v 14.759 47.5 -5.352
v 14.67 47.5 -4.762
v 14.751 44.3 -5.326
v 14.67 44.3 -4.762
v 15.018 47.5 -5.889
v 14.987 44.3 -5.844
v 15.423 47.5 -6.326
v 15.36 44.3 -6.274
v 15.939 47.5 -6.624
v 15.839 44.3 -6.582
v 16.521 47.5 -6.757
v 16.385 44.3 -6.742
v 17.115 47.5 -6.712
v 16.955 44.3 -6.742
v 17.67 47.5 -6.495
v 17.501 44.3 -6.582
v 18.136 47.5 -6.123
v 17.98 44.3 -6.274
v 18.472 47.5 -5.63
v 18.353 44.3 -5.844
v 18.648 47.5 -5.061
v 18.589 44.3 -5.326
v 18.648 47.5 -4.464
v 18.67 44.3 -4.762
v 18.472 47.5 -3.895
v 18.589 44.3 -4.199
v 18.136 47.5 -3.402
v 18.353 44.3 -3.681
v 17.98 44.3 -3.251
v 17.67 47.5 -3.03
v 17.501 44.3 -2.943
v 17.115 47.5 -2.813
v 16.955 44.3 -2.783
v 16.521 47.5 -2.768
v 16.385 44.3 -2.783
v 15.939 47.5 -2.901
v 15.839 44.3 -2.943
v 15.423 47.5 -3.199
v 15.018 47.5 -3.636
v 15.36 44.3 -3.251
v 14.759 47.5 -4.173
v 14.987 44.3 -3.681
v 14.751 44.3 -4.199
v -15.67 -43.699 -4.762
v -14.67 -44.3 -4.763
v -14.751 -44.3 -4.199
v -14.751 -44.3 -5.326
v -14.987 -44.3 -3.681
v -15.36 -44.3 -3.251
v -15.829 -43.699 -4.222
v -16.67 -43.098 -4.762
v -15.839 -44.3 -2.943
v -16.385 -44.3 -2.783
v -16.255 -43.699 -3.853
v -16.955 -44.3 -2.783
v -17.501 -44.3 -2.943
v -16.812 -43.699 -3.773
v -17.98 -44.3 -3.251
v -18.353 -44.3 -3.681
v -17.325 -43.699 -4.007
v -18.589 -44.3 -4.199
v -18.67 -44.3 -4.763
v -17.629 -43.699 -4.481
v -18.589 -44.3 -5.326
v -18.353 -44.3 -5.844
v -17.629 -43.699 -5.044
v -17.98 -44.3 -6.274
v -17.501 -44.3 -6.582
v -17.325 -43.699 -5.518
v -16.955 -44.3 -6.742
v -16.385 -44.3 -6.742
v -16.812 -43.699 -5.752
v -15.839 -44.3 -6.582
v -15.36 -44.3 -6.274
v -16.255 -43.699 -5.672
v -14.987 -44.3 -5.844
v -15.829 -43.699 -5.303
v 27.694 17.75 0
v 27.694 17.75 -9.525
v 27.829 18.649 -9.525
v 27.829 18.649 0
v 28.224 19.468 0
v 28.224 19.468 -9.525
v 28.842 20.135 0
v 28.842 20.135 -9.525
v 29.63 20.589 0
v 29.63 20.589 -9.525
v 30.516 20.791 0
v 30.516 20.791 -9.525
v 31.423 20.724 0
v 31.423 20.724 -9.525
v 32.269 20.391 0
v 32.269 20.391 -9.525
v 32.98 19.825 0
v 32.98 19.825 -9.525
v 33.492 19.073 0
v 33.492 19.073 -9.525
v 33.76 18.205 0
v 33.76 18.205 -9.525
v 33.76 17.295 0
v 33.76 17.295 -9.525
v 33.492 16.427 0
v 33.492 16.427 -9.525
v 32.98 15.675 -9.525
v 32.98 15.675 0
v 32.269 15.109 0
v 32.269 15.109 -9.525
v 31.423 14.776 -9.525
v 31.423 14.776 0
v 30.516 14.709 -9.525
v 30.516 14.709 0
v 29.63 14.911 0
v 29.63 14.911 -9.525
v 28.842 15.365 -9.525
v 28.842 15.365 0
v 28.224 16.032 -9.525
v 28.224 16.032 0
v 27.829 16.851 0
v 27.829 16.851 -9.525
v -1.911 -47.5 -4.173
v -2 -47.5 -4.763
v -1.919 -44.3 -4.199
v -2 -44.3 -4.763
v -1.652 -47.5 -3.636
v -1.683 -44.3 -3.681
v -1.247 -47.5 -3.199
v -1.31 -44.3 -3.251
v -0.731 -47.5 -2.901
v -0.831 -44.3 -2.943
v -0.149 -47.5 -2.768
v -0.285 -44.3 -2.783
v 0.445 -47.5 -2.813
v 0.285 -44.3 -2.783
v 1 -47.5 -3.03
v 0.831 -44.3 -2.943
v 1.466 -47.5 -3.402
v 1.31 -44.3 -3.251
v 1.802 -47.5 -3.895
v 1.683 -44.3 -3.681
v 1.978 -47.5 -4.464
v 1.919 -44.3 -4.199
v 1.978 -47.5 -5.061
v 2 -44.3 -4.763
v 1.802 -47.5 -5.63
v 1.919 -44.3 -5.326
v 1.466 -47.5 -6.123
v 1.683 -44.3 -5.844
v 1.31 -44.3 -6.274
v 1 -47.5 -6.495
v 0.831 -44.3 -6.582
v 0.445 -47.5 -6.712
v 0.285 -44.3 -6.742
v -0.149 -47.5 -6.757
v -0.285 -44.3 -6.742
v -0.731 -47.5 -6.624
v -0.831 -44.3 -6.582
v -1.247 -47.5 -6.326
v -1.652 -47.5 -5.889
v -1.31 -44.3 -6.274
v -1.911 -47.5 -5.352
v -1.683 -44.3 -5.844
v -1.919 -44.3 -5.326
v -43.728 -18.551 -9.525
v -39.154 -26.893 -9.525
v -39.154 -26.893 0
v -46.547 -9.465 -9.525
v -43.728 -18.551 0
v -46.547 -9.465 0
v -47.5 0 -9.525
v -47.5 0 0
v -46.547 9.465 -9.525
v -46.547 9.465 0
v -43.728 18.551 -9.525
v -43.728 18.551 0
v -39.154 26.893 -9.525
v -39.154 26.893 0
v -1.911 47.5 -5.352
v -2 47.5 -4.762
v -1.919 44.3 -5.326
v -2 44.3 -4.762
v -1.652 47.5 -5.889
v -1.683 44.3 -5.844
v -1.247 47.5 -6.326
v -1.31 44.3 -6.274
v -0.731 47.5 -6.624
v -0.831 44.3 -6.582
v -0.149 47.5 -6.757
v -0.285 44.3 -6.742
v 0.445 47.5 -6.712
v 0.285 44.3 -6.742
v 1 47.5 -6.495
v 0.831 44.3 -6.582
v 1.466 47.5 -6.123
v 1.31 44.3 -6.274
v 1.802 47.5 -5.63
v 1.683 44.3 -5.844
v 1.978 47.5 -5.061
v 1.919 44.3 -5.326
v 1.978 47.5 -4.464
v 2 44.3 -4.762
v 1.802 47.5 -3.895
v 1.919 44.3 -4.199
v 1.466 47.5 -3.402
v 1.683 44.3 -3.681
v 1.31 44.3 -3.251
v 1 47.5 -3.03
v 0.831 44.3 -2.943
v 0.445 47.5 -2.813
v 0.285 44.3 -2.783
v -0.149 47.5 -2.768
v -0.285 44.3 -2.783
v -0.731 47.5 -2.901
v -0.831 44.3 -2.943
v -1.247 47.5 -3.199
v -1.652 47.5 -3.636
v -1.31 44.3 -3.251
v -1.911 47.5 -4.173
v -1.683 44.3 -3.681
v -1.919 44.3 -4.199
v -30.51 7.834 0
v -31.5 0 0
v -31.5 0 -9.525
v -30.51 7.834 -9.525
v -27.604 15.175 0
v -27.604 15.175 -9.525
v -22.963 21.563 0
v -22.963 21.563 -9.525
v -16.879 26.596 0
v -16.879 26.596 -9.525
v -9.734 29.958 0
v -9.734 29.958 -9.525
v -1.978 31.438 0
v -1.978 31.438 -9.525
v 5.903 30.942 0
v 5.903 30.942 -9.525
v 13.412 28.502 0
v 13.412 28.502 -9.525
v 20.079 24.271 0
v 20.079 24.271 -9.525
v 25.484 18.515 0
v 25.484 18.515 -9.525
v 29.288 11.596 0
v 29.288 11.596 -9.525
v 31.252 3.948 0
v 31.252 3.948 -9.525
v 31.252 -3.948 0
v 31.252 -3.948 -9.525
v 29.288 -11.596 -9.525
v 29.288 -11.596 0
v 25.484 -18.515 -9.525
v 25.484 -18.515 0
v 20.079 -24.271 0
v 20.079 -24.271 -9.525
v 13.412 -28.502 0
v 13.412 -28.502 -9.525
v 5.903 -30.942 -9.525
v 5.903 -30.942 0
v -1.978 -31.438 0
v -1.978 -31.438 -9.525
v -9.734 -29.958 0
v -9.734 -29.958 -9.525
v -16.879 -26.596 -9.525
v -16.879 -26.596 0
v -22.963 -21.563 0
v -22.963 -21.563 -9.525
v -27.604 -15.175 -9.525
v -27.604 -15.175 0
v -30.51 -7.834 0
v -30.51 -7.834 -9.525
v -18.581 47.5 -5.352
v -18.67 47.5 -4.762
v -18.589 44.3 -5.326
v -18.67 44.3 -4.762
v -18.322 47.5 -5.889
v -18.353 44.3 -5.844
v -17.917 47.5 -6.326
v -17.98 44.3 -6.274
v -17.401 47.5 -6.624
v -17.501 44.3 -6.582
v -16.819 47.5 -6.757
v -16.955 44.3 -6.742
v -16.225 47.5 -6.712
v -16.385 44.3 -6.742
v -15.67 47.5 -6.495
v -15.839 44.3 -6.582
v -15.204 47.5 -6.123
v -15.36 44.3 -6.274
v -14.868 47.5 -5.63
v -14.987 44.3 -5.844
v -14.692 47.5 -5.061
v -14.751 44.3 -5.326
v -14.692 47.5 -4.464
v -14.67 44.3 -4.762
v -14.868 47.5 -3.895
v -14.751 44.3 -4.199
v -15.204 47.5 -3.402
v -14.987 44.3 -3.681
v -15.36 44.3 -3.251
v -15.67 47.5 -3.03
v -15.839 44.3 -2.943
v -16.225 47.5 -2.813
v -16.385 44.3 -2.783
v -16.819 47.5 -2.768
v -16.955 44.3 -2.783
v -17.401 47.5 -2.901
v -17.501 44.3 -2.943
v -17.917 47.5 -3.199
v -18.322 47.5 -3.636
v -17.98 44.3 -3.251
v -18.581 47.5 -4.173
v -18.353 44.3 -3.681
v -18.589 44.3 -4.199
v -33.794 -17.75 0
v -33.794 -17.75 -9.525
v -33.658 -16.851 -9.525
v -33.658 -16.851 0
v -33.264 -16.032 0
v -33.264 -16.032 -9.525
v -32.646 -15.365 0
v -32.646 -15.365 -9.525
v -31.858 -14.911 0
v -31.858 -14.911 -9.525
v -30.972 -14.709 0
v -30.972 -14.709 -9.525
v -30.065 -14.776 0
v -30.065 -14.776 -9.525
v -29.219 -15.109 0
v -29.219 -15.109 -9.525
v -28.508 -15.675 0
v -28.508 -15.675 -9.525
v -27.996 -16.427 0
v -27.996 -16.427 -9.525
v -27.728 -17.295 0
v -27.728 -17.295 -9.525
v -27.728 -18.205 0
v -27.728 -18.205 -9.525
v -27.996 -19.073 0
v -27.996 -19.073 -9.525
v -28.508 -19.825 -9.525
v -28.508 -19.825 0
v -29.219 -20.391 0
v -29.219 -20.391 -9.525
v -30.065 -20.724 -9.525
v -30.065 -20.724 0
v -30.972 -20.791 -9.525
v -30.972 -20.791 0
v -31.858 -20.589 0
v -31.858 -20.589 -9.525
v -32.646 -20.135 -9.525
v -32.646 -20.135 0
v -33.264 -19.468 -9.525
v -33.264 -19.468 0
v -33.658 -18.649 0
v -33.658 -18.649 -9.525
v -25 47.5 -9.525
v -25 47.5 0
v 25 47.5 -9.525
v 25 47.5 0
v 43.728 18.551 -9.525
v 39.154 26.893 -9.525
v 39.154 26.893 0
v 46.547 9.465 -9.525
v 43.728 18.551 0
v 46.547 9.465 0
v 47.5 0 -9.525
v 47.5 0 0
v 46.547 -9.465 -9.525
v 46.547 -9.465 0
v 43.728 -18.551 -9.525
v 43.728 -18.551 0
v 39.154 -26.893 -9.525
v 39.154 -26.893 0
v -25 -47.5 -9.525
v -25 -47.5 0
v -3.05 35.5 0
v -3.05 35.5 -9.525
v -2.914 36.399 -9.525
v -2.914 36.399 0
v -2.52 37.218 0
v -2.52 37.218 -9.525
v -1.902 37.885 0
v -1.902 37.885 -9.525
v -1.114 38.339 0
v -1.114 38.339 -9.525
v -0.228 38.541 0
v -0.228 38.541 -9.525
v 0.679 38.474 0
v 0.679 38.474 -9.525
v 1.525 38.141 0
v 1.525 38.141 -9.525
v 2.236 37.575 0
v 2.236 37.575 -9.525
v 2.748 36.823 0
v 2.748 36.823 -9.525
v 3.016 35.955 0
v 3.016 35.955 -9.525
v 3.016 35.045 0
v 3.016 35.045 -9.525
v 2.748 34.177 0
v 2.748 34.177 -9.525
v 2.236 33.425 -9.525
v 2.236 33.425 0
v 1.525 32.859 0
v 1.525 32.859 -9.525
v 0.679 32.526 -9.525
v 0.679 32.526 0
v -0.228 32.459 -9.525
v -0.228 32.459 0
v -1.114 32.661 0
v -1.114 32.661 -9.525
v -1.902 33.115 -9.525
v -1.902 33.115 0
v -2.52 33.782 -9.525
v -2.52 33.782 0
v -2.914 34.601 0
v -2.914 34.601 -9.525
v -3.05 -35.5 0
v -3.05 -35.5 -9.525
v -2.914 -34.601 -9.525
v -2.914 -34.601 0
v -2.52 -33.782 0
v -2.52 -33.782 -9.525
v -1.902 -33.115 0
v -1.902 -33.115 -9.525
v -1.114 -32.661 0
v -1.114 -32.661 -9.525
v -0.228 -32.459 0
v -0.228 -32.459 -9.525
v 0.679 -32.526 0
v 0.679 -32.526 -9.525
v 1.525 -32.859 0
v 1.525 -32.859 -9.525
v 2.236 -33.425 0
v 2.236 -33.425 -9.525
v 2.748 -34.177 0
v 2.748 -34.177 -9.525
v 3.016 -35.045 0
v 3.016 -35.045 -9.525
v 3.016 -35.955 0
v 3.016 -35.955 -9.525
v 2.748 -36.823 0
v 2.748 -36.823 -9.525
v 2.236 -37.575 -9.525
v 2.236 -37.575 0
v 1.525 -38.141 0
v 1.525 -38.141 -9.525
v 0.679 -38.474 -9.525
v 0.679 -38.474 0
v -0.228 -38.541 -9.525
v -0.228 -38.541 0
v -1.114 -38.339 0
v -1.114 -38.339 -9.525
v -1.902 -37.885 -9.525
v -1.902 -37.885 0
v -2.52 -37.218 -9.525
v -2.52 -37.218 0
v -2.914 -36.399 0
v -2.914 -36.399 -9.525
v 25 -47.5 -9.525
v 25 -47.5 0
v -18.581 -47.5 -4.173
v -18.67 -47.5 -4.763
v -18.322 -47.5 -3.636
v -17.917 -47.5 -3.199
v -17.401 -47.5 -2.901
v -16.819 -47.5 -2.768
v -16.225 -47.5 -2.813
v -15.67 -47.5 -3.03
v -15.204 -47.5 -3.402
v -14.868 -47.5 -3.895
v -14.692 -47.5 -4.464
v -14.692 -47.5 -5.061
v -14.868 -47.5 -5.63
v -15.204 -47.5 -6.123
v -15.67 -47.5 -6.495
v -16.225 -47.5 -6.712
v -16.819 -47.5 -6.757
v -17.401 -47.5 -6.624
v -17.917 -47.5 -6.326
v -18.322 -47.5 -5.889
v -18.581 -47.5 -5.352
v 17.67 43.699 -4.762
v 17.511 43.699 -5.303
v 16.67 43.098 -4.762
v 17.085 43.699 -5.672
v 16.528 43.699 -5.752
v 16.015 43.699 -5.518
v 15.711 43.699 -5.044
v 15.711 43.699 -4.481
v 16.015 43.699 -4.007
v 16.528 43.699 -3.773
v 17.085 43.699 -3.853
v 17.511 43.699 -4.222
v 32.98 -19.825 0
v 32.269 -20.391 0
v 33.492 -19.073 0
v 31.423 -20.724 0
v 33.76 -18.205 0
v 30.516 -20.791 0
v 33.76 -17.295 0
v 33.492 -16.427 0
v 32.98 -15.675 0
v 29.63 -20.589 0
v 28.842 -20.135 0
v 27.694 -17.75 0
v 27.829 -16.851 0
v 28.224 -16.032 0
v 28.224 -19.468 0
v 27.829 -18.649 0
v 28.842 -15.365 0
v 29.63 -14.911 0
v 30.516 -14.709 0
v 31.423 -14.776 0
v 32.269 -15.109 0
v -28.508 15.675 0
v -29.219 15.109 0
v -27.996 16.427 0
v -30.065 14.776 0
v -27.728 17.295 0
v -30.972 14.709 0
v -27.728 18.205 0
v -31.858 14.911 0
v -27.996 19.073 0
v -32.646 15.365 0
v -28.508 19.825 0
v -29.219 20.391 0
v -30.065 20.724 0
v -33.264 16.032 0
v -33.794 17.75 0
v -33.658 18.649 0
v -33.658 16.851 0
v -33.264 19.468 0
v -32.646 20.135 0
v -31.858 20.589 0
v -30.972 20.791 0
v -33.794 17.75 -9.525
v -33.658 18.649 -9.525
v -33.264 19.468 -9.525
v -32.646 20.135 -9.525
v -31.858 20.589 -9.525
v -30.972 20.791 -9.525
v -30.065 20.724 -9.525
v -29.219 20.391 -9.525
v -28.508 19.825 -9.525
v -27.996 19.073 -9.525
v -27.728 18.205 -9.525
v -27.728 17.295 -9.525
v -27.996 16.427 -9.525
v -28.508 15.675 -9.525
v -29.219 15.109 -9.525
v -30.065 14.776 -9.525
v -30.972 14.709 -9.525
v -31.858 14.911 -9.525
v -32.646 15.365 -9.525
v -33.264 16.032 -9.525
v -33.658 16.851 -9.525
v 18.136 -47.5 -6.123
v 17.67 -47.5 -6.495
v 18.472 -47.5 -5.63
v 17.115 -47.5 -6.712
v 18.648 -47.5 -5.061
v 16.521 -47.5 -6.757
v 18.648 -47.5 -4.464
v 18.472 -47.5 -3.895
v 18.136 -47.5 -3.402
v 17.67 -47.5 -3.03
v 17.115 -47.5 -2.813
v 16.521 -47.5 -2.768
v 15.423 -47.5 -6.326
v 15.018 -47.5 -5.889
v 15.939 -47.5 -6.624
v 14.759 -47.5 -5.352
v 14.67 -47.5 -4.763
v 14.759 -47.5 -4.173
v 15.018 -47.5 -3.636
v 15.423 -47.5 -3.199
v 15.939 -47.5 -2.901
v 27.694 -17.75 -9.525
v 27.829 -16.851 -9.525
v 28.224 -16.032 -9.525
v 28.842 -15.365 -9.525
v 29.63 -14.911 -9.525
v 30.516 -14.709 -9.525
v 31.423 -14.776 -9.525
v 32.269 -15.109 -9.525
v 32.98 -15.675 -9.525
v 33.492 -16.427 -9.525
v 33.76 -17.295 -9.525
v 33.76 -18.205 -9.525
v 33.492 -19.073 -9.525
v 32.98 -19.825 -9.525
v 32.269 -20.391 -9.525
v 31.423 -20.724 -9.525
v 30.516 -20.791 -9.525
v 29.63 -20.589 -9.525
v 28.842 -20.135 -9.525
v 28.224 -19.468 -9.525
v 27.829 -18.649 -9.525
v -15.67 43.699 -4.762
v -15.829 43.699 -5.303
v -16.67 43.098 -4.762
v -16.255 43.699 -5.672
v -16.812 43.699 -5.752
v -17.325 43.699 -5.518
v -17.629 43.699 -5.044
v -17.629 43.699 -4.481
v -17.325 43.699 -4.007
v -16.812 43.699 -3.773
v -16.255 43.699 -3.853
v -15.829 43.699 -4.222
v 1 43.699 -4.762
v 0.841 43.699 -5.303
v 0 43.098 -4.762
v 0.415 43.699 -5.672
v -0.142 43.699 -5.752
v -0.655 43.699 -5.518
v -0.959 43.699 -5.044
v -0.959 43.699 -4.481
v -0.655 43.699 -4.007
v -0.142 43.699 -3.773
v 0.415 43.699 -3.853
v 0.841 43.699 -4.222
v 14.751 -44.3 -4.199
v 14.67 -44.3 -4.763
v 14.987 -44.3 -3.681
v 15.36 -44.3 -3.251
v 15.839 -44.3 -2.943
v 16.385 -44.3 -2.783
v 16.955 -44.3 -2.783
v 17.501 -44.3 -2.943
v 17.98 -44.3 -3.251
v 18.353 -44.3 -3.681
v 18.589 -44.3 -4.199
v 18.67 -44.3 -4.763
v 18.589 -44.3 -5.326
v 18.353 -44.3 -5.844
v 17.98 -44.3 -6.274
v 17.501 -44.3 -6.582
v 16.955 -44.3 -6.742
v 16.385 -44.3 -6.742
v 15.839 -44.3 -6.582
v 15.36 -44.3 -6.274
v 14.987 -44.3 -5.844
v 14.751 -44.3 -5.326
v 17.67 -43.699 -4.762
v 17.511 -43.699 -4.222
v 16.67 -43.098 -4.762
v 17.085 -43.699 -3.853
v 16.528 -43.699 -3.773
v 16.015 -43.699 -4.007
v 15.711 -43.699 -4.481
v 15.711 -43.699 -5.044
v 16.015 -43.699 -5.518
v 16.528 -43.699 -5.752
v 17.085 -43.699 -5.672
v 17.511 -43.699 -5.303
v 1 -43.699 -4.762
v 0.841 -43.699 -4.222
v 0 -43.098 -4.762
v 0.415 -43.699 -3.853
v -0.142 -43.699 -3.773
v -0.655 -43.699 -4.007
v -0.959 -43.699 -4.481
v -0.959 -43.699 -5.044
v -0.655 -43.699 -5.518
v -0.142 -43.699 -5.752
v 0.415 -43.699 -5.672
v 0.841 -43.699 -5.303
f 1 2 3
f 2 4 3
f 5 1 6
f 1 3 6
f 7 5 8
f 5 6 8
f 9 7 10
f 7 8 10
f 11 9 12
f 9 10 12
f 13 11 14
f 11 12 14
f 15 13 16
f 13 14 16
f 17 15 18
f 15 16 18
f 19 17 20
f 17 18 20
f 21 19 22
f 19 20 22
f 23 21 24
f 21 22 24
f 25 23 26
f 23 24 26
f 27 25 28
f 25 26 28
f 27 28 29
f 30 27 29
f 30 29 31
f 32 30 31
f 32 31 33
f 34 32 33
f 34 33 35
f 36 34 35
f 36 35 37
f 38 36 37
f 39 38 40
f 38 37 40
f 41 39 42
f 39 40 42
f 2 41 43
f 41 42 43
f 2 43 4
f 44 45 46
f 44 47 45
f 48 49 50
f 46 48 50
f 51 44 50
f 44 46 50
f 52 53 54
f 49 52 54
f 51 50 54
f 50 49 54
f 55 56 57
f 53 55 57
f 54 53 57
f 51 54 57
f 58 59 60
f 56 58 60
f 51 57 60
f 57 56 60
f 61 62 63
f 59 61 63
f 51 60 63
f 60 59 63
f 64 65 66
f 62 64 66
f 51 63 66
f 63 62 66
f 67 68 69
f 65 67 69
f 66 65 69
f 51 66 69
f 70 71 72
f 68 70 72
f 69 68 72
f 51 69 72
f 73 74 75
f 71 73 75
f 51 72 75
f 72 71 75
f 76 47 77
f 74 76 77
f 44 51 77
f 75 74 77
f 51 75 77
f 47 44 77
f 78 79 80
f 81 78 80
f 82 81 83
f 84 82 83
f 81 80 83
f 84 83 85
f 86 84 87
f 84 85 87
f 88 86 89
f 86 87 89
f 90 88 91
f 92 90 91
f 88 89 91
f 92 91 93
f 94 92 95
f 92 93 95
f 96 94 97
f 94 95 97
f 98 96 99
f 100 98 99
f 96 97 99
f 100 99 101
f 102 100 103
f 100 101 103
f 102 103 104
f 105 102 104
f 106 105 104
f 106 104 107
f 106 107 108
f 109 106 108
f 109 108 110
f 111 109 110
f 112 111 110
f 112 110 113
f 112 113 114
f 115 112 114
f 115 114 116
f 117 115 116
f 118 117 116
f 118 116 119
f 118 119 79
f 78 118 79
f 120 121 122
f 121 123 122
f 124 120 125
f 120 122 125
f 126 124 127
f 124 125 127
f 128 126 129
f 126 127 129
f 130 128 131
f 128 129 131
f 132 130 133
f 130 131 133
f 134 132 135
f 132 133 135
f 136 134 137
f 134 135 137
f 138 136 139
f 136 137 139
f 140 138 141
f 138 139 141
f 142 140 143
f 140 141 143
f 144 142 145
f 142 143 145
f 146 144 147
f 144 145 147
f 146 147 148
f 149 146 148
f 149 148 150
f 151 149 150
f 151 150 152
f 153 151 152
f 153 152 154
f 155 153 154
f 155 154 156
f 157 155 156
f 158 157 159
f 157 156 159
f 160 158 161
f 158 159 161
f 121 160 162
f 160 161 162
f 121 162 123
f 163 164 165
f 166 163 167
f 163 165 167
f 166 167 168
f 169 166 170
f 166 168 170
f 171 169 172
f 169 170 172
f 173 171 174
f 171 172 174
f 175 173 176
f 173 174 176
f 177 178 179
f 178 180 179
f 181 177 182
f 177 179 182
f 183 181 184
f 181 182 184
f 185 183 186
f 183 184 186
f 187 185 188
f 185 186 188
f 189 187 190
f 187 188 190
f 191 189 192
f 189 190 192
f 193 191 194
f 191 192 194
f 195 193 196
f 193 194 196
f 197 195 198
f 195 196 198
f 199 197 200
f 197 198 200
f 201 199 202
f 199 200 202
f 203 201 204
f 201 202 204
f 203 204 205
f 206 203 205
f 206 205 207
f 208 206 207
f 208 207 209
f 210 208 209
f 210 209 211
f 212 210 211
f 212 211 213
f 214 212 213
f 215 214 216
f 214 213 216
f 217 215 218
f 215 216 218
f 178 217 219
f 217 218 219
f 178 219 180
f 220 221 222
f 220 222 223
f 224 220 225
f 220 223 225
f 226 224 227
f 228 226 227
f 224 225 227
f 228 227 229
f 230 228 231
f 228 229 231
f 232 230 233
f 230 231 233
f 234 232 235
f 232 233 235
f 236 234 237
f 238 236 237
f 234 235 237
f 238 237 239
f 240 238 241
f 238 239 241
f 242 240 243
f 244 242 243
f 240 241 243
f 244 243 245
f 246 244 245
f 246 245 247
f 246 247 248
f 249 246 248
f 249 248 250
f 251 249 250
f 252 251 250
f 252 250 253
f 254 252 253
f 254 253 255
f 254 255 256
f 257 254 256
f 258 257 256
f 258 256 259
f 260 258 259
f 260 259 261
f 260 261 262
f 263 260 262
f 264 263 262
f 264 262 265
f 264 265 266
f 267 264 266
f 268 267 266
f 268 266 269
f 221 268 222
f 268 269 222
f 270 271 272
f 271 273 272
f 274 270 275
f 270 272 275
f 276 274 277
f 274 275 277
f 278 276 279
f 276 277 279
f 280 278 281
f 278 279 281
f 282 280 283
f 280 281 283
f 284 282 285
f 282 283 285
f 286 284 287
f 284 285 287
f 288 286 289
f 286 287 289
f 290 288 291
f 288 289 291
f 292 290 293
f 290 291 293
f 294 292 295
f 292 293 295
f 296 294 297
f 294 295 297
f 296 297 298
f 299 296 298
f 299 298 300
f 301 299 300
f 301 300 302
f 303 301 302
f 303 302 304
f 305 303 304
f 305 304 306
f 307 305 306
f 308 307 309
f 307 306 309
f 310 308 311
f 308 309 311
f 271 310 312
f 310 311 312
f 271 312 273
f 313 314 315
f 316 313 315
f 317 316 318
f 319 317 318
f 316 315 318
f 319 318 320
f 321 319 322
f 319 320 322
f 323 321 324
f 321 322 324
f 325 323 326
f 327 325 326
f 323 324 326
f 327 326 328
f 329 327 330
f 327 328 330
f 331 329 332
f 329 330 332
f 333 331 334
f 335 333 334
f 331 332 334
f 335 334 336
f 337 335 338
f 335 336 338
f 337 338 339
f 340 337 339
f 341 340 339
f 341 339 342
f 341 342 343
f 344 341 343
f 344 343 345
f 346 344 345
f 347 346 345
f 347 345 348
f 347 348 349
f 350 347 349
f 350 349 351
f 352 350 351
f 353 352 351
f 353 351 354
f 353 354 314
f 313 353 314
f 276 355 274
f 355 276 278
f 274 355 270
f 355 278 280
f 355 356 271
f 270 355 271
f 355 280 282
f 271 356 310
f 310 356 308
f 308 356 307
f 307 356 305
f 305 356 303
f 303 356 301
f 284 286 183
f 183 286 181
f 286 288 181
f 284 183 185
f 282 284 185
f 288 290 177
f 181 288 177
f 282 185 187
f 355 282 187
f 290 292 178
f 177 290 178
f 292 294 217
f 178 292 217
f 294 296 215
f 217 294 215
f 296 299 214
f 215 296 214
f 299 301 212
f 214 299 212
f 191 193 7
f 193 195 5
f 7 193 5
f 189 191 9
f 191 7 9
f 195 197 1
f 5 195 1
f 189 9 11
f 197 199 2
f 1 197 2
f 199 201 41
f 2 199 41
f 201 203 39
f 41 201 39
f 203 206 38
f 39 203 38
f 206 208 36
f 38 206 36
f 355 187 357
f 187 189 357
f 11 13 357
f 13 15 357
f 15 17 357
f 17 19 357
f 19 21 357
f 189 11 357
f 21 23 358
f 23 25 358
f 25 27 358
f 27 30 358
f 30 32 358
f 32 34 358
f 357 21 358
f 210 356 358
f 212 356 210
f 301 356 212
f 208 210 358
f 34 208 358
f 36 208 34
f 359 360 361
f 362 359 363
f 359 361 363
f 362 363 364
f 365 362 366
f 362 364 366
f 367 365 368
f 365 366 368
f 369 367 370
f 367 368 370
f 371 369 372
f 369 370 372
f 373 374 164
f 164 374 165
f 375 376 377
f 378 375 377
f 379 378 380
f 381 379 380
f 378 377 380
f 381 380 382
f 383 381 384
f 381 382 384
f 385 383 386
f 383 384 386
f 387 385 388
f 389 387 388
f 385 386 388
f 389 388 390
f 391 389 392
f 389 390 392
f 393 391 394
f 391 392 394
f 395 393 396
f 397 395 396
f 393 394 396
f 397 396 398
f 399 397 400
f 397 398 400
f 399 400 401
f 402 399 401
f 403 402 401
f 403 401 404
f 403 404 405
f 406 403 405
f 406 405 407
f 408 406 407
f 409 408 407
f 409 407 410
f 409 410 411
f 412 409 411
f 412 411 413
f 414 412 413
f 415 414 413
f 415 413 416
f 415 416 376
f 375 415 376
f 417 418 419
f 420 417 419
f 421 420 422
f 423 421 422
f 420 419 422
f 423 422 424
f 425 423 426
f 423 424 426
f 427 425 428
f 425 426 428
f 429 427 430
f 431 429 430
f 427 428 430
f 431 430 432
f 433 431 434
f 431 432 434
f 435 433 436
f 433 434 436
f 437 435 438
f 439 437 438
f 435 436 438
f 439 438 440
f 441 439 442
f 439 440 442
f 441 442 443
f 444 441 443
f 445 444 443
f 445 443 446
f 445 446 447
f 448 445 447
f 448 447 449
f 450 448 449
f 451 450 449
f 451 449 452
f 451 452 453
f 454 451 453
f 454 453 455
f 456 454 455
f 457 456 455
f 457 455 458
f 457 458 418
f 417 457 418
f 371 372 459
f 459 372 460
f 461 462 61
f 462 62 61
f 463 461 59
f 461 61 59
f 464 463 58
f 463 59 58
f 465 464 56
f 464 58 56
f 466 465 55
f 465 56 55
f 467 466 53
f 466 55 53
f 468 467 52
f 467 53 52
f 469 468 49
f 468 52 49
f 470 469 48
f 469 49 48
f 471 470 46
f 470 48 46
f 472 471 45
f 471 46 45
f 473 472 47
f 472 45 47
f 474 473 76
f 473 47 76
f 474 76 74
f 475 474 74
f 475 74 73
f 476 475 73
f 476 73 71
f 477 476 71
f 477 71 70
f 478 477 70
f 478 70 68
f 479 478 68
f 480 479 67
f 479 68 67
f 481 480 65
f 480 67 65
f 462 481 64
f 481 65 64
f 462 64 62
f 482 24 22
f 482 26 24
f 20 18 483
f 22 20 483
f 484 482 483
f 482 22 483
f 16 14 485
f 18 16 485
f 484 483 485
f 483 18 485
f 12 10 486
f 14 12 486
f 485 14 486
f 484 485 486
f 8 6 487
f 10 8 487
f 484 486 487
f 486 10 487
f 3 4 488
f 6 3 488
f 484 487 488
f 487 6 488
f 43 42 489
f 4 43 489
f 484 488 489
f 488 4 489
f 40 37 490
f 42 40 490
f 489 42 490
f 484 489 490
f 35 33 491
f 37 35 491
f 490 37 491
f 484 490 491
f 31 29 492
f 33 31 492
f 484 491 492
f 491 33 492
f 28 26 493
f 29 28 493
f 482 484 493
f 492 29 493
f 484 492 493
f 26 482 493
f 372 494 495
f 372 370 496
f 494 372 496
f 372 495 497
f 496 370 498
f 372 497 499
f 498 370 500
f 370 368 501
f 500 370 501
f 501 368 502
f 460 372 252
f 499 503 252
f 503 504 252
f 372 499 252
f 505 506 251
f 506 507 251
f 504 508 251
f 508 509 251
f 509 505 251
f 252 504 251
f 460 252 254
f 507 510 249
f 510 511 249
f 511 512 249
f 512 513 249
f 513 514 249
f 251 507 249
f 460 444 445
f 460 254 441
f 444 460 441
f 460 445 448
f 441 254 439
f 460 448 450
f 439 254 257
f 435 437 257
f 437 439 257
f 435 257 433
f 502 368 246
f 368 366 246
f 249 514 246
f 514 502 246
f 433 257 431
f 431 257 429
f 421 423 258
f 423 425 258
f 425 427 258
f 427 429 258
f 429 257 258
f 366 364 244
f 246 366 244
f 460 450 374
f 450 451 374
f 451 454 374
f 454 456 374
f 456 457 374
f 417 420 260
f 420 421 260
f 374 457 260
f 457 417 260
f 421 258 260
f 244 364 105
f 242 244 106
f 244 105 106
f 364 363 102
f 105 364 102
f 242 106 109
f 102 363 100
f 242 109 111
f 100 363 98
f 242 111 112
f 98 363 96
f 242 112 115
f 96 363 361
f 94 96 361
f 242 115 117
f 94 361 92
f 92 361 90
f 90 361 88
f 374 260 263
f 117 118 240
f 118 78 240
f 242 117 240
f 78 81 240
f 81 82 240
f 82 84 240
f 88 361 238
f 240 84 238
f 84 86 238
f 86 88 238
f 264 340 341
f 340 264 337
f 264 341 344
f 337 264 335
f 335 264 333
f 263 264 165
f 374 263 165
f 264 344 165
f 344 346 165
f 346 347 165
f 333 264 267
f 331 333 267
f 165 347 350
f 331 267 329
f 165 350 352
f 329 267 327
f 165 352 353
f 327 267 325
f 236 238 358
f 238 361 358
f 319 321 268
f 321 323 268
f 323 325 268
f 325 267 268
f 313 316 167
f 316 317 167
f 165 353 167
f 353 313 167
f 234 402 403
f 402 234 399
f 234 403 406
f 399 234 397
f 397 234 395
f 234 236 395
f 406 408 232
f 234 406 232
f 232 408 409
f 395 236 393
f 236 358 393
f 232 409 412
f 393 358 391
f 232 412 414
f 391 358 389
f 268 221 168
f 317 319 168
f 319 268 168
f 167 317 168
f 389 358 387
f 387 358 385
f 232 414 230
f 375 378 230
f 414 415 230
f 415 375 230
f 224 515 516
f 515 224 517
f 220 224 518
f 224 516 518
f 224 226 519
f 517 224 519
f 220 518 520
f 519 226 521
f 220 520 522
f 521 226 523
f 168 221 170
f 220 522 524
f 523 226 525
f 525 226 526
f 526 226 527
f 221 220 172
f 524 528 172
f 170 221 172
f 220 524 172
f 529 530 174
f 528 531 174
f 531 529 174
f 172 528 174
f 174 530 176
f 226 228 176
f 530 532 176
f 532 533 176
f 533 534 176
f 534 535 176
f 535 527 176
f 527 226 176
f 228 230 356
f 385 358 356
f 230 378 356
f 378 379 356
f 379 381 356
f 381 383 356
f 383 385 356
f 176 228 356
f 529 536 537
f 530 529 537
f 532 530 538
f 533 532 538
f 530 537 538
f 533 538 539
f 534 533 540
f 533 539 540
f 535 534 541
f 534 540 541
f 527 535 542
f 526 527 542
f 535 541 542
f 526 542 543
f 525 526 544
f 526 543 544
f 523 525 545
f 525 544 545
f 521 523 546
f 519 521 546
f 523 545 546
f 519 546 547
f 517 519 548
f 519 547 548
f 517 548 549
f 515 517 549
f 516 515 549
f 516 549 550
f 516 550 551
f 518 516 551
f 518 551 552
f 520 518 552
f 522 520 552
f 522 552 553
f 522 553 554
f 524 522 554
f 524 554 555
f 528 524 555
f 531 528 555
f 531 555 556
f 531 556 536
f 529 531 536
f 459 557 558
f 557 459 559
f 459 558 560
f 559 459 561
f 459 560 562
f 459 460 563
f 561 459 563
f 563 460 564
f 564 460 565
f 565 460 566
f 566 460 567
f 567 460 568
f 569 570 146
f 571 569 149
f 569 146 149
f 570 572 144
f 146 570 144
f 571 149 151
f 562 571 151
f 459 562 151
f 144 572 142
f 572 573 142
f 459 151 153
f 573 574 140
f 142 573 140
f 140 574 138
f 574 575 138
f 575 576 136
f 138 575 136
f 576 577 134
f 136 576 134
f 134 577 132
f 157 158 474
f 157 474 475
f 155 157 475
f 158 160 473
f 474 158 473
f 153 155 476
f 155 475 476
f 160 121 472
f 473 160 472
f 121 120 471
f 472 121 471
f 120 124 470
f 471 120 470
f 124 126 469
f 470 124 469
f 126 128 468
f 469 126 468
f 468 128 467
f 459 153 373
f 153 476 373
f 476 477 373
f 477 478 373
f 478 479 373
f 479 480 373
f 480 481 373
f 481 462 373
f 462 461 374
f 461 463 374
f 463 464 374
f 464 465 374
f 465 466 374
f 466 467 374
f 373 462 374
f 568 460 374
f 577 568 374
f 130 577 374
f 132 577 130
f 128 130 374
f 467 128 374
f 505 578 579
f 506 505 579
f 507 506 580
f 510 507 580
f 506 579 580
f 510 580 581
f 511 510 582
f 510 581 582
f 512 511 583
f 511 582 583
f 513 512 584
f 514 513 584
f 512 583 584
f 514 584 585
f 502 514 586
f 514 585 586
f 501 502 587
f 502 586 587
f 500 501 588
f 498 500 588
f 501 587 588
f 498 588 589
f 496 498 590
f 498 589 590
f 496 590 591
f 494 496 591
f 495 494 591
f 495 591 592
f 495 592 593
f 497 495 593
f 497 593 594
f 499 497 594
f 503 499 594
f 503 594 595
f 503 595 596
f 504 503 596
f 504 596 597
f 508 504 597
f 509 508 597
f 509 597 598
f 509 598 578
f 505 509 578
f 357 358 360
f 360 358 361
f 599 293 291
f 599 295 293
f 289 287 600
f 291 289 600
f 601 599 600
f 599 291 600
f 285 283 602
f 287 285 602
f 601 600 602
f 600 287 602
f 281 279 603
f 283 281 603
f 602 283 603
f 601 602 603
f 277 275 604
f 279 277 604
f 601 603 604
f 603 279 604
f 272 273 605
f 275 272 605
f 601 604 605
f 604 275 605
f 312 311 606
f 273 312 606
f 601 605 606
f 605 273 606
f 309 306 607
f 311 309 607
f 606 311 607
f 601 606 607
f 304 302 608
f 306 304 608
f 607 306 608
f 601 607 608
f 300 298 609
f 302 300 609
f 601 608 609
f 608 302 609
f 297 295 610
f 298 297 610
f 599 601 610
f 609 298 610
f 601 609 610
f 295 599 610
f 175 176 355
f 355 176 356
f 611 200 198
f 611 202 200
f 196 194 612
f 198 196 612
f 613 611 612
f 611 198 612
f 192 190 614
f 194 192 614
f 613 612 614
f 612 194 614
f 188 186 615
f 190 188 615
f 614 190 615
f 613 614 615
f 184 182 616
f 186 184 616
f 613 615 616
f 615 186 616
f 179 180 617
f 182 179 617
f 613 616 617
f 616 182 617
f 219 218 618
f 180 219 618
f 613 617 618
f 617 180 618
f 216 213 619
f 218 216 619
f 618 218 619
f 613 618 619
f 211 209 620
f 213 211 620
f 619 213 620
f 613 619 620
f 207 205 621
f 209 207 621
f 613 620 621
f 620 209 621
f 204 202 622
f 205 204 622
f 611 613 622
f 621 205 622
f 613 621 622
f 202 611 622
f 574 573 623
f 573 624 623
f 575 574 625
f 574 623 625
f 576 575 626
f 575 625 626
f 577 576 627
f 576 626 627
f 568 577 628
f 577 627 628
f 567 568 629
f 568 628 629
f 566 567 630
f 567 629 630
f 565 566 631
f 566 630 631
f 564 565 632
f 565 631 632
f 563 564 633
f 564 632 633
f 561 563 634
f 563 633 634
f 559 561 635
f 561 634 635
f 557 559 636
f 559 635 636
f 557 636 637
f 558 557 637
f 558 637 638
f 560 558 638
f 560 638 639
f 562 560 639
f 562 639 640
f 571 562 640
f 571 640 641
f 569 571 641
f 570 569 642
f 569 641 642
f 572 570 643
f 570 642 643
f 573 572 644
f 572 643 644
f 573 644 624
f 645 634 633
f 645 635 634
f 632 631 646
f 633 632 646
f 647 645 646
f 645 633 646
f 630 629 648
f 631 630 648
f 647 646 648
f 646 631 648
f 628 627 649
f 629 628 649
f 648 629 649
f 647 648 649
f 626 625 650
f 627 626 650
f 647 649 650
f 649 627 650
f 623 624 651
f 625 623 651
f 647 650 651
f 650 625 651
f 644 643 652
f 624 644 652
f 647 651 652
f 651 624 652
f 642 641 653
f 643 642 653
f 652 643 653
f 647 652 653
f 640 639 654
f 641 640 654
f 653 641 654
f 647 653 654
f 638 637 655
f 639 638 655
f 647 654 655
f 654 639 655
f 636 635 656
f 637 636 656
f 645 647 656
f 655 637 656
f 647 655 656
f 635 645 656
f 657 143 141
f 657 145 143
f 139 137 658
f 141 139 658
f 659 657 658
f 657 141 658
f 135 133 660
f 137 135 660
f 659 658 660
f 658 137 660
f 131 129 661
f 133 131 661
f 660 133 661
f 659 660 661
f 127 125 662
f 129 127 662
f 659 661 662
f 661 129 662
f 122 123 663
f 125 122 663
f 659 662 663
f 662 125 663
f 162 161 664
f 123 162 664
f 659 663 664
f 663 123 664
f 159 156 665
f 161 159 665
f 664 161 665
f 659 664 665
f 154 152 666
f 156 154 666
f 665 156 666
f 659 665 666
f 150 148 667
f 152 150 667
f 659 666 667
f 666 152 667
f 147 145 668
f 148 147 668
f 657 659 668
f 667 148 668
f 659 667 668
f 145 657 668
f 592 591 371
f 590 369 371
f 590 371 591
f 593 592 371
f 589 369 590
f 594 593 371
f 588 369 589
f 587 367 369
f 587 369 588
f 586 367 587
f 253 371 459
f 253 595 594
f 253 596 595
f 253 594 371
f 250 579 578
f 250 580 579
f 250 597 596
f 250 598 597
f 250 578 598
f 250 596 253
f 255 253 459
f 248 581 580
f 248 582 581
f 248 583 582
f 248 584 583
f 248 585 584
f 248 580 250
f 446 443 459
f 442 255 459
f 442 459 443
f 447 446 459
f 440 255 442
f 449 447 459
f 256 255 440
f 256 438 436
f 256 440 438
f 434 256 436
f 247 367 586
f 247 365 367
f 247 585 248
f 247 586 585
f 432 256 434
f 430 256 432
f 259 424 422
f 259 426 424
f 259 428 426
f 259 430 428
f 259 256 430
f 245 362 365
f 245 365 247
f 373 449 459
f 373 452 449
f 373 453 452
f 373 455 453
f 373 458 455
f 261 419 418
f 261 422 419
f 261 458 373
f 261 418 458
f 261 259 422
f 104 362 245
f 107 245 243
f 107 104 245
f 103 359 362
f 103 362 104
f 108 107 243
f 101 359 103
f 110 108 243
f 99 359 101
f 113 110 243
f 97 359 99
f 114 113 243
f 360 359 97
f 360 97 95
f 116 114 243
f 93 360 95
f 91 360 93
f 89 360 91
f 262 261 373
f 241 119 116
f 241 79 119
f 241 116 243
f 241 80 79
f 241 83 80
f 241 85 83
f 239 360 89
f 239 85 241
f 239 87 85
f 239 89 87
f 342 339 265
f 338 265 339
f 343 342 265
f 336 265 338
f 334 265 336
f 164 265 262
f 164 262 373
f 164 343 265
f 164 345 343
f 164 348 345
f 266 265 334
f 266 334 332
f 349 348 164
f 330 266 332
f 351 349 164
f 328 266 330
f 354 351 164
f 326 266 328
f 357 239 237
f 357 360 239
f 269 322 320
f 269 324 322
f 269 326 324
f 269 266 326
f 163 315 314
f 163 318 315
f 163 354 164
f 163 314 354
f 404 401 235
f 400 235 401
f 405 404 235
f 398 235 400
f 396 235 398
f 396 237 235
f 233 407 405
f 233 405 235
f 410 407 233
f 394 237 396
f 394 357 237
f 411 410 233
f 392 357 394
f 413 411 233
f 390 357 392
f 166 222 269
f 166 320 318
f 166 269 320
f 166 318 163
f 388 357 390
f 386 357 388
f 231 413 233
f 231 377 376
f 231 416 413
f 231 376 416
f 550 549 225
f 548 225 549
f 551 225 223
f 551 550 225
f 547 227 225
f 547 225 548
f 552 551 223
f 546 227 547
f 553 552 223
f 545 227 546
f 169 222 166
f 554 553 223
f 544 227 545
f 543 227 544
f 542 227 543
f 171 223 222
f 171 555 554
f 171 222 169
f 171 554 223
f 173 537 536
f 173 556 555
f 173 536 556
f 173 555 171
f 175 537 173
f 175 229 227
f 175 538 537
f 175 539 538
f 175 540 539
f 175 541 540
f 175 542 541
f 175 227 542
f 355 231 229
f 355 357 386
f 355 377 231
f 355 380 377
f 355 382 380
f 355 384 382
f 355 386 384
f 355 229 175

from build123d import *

# Parameters (mm, degrees)
BOSS_EXTRUDE1_DEPTH       = 9.525
F_6_0MM_DOWEL_HOLE1_D     = 6.1
SKETCH4_R                 = 31.5
CUT_EXTRUDE1_DEPTH        = 68.847075287
F_4_0MM_DOWEL_HOLE1_D     = 4
F_4_0MM_DOWEL_HOLE1_DEPTH = 3.2
F_4_0MM_DOWEL_HOLE1_TIP   = 1.201721238
F_4_0MM_DOWEL_HOLE2_D     = 4
F_4_0MM_DOWEL_HOLE2_DEPTH = 3.2
F_4_0MM_DOWEL_HOLE2_TIP   = 1.201721238


with BuildPart() as part:
    # Sketch1 → Boss-Extrude1 (new body)
    with BuildSketch(Plane.XY):
        with BuildLine():
            Line((-25, 47.5), (25, 47.5))
            Line((25, 47.5), (39.154013015, 26.892624729))
            ThreePointArc((39.154013015, 26.892624729), (47.5, 0), (39.154013015, -26.892624729))
            Line((39.154013015, -26.892624729), (25, -47.5))
            Line((25, -47.5), (-25, -47.5))
            Line((-25, -47.5), (-39.154013015, -26.892624729))
            ThreePointArc((-39.154013015, -26.892624729), (-47.5, 0), (-39.154013015, 26.892624729))
            Line((-39.154013015, 26.892624729), (-25, 47.5))
        make_face()
    extrude(amount=-BOSS_EXTRUDE1_DEPTH)

    # Ø6.0mm Dowel Hole1 (through all)
    with Locations(Plane.XY):
        with Locations((-30.743901834, 17.75), (0, 35.5), (30.743901834, 17.75), (30.743901834, -17.75), (0, -35.5), (-30.743901834, -17.75)):
            Hole(F_6_0MM_DOWEL_HOLE1_D / 2)

    # Sketch4 → Cut-Extrude1 (cut, through all)
    with BuildSketch(Plane(origin=(0, 0, -9.525), x_dir=(-1, 0, 0), z_dir=(0, 0, -1))):
        Circle(SKETCH4_R)
    extrude(amount=-CUT_EXTRUDE1_DEPTH, mode=Mode.SUBTRACT)

    # Ø4.0mm Dowel Hole1
    with Locations(Plane(origin=(0, 47.5, 0), x_dir=(1, 0, 0), z_dir=(0, 1, 0))):
        with Locations((-16.67, 4.7625), (0, 4.7625), (16.67, 4.7625)):
            Hole(F_4_0MM_DOWEL_HOLE1_D / 2, depth=F_4_0MM_DOWEL_HOLE1_DEPTH)
            with Locations((0, 0, -(F_4_0MM_DOWEL_HOLE1_DEPTH + F_4_0MM_DOWEL_HOLE1_TIP / 2))):  # 118° drill point
                Cone(0, F_4_0MM_DOWEL_HOLE1_D / 2, F_4_0MM_DOWEL_HOLE1_TIP, mode=Mode.SUBTRACT)

    # Ø4.0mm Dowel Hole2
    with Locations(Plane.XZ.offset(47.5)):
        with Locations((0, -4.7625), (-16.67, -4.7625), (16.67, -4.7625)):
            Hole(F_4_0MM_DOWEL_HOLE2_D / 2, depth=F_4_0MM_DOWEL_HOLE2_DEPTH)
            with Locations((0, 0, -(F_4_0MM_DOWEL_HOLE2_DEPTH + F_4_0MM_DOWEL_HOLE2_TIP / 2))):  # 118° drill point
                Cone(0, F_4_0MM_DOWEL_HOLE2_D / 2, F_4_0MM_DOWEL_HOLE2_TIP, mode=Mode.SUBTRACT)


solid = part.part
